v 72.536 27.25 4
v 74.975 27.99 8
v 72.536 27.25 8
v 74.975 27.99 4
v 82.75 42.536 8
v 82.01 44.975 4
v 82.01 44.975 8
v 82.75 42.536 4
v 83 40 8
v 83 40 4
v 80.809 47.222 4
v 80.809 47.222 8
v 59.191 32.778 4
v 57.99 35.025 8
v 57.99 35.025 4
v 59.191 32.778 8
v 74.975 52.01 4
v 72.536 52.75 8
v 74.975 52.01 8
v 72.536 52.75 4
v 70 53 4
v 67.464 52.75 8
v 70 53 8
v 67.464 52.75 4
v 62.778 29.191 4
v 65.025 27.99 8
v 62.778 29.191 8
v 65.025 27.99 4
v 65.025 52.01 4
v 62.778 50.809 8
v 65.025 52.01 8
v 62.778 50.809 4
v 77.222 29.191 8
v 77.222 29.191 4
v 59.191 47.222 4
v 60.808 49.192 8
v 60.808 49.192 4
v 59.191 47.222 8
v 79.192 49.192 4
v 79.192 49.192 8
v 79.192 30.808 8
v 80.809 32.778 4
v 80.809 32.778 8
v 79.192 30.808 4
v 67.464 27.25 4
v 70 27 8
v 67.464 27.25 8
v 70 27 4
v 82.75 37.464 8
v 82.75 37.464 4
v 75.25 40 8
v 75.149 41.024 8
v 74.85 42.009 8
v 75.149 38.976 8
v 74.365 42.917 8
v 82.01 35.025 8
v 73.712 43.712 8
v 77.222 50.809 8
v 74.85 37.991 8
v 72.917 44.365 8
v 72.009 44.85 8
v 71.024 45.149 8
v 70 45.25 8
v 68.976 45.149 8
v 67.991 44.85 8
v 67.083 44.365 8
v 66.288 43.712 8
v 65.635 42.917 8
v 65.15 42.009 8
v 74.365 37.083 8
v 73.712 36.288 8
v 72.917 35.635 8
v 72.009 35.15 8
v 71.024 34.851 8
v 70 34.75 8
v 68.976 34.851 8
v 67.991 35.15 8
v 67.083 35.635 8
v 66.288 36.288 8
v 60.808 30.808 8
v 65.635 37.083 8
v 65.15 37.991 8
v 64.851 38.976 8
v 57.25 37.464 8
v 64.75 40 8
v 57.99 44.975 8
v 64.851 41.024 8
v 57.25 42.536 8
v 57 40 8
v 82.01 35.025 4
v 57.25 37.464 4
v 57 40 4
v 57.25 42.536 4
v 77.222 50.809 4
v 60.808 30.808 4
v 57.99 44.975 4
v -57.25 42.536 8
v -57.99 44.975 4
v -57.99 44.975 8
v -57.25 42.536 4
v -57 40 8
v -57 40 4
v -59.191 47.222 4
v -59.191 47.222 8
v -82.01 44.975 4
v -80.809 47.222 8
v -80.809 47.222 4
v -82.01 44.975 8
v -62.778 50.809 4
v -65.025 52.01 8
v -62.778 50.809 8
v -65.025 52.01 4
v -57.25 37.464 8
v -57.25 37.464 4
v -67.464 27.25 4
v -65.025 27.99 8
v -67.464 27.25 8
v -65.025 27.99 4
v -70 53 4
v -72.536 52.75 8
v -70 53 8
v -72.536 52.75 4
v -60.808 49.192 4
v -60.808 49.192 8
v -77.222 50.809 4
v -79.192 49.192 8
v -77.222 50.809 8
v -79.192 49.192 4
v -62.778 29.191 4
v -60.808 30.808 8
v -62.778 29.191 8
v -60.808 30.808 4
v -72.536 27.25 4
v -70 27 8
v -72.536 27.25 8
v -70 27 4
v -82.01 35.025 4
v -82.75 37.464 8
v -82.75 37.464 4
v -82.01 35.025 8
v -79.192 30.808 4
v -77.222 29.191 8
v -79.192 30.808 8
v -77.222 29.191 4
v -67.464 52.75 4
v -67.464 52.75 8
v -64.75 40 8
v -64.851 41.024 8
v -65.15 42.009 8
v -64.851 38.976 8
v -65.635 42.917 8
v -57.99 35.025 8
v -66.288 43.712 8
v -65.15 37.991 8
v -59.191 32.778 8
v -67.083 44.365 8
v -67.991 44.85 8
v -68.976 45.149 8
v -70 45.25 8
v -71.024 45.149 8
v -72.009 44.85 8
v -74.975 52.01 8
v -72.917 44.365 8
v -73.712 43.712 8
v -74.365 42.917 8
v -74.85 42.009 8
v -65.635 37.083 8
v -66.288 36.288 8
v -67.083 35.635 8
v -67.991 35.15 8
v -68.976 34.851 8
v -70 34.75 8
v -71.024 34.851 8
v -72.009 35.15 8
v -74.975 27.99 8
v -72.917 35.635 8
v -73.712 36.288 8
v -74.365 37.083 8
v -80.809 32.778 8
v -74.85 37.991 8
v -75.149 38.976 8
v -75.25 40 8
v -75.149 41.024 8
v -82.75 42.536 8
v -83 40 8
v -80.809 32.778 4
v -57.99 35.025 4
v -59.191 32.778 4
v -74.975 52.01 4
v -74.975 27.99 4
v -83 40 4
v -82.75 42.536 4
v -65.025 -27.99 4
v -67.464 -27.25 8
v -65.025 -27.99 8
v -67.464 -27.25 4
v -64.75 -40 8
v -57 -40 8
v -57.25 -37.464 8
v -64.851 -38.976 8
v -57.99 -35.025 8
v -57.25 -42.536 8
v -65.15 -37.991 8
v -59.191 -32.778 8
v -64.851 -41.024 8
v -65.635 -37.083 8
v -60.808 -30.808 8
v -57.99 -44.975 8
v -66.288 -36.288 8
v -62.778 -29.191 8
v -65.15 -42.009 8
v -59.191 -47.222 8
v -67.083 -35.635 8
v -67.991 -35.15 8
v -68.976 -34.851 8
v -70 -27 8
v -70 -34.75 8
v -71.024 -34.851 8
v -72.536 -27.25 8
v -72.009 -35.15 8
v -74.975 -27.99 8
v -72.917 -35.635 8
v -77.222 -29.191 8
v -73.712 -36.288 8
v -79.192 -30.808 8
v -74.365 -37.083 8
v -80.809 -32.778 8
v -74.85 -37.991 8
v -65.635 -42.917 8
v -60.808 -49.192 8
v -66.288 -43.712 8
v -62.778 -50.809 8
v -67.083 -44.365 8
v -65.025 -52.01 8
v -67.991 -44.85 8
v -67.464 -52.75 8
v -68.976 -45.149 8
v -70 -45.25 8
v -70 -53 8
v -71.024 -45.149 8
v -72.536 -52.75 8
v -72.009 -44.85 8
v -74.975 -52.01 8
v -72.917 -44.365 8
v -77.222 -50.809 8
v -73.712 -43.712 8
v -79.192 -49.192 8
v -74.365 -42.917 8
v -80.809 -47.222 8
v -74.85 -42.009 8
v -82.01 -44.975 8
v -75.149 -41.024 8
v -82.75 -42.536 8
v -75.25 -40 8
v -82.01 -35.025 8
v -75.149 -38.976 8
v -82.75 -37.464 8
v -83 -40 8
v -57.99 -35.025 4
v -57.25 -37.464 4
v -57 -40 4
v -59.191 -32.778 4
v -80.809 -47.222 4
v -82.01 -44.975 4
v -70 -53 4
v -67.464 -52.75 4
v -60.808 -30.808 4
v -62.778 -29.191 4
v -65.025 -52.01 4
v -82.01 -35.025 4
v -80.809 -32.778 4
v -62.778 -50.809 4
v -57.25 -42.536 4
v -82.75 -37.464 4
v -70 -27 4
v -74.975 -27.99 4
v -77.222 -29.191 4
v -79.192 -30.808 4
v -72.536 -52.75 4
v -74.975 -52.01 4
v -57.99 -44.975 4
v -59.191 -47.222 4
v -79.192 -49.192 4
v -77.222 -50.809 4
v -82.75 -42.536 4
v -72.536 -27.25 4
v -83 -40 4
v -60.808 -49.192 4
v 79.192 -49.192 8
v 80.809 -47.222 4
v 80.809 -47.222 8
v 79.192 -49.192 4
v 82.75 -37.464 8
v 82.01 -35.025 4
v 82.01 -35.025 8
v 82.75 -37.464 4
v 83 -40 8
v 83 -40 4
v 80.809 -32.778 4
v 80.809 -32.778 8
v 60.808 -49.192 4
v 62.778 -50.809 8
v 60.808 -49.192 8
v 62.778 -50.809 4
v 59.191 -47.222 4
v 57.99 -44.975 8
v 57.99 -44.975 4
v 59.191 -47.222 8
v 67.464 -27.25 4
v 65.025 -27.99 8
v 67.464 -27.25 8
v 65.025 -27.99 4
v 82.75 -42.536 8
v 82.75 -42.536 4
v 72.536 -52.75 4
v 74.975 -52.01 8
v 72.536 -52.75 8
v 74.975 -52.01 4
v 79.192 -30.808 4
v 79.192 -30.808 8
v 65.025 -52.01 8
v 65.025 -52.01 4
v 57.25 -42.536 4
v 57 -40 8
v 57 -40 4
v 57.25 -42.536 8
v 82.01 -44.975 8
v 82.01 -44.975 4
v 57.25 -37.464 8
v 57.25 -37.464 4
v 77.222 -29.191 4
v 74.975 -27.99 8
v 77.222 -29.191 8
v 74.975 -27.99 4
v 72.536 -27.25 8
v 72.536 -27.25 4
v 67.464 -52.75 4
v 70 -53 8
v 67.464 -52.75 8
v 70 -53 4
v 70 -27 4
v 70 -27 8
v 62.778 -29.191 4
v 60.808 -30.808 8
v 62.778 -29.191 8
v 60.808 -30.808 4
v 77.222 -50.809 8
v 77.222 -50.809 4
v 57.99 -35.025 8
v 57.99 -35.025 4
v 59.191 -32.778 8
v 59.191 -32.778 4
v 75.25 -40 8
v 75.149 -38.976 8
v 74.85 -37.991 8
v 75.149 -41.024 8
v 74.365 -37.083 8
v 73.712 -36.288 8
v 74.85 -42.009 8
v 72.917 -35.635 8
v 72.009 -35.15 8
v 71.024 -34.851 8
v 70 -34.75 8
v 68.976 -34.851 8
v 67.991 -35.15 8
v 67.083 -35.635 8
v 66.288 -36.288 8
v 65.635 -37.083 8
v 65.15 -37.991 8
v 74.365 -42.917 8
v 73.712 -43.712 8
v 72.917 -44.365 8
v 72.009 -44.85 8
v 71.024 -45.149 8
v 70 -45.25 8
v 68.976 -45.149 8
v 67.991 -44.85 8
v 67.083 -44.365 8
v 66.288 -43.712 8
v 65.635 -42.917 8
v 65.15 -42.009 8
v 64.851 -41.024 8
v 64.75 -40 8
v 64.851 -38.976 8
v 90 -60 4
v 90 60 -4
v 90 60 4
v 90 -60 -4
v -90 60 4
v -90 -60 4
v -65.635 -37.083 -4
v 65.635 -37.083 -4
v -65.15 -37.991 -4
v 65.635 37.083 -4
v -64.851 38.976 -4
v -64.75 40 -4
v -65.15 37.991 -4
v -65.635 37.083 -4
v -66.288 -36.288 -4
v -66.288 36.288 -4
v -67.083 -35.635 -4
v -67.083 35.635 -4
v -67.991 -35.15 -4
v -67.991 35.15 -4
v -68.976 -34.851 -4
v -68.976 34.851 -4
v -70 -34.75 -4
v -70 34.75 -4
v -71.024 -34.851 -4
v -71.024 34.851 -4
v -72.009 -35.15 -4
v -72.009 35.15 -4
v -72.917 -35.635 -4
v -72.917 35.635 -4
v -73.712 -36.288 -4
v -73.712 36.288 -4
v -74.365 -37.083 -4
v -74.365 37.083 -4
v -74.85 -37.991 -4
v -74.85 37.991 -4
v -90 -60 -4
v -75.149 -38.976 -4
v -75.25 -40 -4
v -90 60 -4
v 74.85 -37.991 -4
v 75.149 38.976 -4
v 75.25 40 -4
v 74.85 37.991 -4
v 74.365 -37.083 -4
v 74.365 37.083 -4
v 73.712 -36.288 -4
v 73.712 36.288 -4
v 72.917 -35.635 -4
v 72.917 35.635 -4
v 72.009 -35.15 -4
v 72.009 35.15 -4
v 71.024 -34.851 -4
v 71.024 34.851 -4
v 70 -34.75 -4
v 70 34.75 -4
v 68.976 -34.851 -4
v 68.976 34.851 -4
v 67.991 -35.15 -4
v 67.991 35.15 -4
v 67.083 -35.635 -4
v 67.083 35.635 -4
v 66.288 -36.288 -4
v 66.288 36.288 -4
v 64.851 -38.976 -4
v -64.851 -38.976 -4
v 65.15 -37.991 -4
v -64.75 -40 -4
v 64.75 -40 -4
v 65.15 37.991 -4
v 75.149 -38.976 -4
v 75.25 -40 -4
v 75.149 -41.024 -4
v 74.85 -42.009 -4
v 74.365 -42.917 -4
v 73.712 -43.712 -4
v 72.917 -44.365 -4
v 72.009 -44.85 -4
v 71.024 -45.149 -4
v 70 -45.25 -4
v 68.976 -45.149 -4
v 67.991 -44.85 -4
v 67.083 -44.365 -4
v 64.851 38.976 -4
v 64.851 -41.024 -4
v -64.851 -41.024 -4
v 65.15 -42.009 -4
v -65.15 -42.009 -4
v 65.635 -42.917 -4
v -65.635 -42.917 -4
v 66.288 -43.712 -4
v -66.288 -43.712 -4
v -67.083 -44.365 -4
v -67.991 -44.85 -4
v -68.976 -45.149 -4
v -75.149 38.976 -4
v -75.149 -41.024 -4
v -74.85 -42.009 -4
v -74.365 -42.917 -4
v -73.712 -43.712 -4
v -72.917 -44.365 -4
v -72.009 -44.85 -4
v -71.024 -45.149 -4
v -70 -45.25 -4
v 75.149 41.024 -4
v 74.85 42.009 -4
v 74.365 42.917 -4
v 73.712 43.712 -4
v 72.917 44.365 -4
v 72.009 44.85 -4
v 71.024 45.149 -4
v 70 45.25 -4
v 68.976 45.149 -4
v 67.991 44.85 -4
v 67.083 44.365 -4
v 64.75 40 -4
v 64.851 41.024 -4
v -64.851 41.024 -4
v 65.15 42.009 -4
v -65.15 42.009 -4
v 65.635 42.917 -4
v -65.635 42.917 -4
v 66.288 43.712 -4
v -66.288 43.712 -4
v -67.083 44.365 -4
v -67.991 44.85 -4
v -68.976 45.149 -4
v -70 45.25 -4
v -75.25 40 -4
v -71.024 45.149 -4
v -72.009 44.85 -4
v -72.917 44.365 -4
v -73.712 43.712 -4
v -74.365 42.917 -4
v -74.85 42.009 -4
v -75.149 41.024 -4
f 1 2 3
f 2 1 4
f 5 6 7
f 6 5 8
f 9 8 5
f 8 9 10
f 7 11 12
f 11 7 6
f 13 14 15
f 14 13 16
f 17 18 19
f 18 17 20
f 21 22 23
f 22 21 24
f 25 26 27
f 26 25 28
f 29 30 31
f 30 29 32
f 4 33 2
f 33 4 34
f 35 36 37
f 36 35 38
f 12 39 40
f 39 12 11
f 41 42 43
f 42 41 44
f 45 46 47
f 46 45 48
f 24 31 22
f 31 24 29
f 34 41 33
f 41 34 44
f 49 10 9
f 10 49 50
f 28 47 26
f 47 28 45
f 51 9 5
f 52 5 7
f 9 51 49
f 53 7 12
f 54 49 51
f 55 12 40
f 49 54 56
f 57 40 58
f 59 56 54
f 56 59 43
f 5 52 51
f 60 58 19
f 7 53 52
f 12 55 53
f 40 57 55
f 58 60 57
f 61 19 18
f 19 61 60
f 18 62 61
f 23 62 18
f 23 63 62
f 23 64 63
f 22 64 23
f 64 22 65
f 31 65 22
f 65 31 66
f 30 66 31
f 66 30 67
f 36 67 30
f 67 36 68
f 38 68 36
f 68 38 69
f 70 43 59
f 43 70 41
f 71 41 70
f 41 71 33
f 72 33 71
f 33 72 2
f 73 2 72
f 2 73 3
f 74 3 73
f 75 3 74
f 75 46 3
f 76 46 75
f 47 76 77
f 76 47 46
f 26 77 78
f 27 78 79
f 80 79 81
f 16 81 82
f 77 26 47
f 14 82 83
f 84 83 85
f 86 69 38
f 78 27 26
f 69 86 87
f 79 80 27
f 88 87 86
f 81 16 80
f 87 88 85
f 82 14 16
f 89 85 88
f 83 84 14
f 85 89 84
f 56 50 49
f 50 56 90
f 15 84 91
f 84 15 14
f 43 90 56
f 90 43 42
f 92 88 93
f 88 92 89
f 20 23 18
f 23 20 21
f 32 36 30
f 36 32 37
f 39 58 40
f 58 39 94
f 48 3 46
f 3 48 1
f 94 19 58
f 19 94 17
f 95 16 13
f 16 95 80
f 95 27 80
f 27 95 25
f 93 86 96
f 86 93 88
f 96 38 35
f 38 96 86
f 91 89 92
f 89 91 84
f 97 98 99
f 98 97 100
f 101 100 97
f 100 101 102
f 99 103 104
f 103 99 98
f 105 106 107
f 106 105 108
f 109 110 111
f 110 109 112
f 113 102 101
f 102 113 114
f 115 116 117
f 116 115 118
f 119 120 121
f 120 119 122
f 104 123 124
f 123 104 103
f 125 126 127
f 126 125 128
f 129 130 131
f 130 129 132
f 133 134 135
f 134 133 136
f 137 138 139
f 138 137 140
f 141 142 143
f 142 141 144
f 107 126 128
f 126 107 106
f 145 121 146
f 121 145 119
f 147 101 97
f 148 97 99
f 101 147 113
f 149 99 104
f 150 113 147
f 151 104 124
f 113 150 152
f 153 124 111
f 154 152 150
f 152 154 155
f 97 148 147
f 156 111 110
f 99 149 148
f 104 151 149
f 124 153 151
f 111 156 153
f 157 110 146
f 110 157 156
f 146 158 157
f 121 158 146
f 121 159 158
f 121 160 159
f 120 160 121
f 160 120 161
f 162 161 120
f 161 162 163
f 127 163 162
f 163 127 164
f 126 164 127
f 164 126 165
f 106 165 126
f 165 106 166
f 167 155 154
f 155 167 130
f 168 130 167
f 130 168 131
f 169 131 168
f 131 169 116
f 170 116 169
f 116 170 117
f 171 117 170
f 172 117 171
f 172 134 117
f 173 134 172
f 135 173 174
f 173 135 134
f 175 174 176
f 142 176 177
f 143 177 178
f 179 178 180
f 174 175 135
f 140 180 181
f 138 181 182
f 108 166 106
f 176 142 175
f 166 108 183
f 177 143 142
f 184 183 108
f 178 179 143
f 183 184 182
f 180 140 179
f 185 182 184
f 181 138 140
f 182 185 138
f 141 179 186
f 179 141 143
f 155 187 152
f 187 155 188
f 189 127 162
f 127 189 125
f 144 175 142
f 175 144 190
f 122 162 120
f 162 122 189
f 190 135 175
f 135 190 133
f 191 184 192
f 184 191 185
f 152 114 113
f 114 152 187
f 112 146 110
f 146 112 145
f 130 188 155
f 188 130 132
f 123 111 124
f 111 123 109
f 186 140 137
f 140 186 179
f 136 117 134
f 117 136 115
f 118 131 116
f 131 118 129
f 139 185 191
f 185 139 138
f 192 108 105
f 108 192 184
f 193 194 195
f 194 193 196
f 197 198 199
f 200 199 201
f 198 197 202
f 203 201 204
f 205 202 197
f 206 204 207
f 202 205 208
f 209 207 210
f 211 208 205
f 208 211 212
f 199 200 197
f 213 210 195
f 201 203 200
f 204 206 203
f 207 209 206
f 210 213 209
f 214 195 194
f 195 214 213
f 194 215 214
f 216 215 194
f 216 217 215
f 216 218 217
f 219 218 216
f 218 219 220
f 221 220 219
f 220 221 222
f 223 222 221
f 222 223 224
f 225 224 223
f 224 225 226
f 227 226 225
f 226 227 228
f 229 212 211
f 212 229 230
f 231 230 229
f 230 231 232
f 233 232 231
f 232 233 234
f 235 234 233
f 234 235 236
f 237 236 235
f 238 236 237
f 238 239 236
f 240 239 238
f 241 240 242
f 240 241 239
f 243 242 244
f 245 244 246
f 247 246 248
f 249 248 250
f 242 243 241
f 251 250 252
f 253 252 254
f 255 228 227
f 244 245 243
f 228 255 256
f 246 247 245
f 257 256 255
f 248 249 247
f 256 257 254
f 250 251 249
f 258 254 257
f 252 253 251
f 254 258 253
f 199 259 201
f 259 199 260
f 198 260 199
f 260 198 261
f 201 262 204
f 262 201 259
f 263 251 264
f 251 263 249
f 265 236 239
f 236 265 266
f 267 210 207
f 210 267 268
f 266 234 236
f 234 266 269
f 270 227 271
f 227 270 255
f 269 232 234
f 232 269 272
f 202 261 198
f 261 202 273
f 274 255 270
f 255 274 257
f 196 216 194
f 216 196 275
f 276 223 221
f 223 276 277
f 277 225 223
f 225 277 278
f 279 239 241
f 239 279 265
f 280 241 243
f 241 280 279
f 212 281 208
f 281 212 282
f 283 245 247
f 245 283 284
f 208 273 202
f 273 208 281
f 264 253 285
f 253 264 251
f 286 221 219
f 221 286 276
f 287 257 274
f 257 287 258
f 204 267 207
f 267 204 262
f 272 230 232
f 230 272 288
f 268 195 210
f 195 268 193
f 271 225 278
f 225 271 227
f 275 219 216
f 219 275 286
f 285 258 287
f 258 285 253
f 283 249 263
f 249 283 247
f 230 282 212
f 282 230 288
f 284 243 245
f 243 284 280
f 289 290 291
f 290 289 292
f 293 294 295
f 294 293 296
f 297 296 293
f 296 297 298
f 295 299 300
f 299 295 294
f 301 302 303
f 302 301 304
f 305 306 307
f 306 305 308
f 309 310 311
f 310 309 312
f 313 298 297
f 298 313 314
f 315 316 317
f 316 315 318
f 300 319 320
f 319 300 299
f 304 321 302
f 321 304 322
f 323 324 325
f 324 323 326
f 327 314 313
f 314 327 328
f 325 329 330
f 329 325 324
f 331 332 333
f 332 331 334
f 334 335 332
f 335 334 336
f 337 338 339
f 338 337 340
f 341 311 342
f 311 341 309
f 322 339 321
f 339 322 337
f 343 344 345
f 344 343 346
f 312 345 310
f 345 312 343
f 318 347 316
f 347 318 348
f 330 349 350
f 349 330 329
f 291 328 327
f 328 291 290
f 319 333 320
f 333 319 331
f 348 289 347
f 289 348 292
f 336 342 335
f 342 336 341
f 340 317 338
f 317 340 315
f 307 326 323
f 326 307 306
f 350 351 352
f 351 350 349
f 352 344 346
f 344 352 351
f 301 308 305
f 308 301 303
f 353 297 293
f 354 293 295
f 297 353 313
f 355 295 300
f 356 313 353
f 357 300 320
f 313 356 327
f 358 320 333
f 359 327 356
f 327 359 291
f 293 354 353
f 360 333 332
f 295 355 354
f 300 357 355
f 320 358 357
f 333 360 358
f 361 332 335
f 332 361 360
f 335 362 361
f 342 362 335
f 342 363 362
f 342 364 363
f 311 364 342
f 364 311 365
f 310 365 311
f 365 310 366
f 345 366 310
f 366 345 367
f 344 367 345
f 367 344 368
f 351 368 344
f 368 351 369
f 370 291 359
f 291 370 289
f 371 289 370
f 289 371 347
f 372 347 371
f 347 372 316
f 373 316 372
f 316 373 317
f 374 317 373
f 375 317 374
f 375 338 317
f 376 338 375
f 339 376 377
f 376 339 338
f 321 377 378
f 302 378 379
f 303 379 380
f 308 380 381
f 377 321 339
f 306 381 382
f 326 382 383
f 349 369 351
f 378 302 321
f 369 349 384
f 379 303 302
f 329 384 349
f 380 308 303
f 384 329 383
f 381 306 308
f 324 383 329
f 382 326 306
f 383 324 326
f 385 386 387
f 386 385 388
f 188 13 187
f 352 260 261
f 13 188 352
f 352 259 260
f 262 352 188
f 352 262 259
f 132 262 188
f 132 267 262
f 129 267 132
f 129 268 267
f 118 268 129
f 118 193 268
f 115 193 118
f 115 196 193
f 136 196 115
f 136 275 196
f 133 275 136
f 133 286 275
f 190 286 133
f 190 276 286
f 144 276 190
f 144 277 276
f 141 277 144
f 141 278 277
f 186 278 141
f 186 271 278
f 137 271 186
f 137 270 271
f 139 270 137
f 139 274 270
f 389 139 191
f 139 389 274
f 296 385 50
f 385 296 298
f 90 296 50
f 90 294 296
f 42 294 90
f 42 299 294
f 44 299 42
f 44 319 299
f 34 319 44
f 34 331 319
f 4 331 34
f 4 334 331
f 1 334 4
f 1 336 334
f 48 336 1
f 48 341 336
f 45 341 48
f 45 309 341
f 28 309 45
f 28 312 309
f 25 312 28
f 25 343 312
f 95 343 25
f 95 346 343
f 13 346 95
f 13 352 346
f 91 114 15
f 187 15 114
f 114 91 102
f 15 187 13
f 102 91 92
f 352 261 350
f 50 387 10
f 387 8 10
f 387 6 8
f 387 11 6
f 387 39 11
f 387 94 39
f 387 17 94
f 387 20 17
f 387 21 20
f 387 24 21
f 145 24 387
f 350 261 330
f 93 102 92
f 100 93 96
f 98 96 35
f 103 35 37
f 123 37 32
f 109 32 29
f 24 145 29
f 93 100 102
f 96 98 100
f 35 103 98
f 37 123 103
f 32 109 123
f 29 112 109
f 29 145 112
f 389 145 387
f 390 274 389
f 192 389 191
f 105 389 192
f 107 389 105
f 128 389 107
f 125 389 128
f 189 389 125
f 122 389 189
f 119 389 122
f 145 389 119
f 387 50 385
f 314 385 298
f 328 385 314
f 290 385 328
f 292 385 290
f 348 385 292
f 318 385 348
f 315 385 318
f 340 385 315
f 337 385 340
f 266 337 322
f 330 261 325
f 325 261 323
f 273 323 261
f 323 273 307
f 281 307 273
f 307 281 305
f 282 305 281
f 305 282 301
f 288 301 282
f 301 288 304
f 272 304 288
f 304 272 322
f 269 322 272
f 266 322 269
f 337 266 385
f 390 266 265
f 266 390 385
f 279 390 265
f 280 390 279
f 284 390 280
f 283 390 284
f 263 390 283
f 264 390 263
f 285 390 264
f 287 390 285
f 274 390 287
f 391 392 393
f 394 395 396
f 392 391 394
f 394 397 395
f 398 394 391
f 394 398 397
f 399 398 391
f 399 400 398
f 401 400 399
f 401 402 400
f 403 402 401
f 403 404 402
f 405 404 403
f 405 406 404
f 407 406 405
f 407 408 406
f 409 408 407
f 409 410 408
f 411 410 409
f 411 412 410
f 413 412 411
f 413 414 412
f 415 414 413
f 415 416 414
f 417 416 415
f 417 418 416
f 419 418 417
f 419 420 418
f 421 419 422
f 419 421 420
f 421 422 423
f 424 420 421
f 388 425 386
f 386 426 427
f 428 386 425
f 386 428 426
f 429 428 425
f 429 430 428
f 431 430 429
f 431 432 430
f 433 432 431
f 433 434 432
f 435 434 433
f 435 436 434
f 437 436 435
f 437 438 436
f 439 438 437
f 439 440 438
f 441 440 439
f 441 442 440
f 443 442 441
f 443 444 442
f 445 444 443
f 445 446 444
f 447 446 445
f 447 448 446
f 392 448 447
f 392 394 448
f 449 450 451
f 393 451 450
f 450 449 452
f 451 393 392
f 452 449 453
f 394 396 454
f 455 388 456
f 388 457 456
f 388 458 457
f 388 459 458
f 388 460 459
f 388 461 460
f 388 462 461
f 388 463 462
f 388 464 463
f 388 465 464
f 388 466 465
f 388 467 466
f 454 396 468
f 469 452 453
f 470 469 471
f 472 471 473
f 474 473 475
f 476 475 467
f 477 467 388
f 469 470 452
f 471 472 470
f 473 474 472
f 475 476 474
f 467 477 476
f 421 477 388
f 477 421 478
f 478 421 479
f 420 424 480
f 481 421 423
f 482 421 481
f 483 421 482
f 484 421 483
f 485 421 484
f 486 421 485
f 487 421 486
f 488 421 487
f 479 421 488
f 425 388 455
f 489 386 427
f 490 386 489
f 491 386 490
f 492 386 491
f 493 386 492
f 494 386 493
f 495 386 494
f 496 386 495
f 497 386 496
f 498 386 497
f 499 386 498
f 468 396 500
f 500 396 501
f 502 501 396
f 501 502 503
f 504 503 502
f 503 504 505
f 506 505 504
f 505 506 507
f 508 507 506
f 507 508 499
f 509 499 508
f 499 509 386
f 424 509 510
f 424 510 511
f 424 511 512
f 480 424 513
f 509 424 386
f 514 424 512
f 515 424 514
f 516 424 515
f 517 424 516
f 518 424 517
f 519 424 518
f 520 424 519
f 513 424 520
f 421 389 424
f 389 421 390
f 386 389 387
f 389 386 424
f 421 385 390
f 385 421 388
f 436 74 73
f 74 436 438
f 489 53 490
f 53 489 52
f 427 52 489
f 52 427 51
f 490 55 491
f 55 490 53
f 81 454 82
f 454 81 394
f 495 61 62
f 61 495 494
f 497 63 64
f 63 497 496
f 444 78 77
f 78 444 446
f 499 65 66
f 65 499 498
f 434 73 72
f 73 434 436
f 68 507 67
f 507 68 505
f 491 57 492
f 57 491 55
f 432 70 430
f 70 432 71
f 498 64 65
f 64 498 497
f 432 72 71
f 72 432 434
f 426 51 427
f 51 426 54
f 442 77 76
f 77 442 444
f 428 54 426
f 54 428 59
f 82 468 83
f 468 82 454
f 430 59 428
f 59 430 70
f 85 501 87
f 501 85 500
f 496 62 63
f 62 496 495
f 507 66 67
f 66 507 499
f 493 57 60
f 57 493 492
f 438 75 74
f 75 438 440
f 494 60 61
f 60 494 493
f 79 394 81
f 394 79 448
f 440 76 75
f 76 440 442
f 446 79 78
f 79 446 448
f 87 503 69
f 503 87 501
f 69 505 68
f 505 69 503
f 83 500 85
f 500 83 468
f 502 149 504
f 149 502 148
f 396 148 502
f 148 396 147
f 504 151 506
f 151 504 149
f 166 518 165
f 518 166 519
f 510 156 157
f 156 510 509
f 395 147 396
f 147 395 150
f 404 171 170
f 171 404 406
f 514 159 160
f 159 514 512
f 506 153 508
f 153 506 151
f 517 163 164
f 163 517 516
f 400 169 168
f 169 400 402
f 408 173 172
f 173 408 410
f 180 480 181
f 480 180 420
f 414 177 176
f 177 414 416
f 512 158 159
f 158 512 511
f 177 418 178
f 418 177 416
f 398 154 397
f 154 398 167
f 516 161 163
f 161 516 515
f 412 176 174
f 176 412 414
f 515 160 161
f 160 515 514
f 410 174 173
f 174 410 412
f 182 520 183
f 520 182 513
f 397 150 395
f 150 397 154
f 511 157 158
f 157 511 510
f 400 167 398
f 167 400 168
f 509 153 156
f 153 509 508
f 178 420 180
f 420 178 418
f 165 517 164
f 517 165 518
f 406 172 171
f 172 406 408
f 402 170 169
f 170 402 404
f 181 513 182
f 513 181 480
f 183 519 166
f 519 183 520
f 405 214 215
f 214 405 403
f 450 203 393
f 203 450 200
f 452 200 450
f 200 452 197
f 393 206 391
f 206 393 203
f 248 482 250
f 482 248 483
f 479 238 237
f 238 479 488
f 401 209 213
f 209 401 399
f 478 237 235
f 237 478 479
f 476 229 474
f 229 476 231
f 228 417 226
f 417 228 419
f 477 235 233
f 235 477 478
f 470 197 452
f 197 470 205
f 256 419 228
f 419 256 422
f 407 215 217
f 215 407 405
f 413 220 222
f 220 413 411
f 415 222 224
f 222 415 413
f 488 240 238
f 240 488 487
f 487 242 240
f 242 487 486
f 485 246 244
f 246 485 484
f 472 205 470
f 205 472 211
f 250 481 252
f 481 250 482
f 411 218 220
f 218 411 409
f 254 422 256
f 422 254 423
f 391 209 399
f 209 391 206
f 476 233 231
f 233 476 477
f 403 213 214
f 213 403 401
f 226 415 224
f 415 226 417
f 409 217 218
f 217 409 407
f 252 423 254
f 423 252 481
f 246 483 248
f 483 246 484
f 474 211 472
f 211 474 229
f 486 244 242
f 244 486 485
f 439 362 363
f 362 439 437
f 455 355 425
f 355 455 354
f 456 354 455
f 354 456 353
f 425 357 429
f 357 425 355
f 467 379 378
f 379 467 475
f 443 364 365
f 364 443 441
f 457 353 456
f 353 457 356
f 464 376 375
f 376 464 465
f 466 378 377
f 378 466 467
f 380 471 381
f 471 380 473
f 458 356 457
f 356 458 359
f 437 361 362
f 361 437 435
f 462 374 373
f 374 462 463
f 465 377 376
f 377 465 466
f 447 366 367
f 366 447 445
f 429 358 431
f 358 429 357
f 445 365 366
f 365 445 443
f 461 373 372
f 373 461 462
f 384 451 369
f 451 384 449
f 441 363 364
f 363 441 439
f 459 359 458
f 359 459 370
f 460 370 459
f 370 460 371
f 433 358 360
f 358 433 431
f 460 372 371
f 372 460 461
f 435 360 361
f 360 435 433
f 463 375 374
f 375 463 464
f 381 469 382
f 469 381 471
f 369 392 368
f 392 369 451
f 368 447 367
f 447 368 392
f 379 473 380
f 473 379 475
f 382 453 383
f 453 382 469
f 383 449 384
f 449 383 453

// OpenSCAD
$fn = 32;

// ----------------------------------------------------------------------
// Anchor pads 180 x 120 x 12
// four corner bosses with anchor holes
// ----------------------------------------------------------------------

// --- parameters (mm) ---
plate = [180, 120, 8];  // base plate size (x, y, z)
pads = 4;               // boss count, one per corner
edge = 20;              // boss centre offset from the plate edge
boss_d = 26;            // boss diameter
boss_h = 4;             // boss height above the base plate
hole_d = 10.5;          // hole diameter

// --- derived feature positions (mm) ---
height = plate[2] + boss_h;      // = 12   overall height of the part
corner_x = plate[0] / 2 - edge;  // = 70   boss centre X
corner_y = plate[1] / 2 - edge;  // = 40   boss centre Y
feature_centers = [
  [corner_x, corner_y],
  [-corner_x, corner_y],
  [-corner_x, -corner_y],
  [corner_x, -corner_y]
];   // boss centres, anchor holes are drilled there

// base plate, four bosses standing on it, anchor holes all the way through
difference() {
  union() {
    cube(plate, center = true);
    for (centre = feature_centers)
      translate([centre[0], centre[1], plate[2] / 2 - 1])
        cylinder(d = boss_d, h = boss_h + 1);
  }
  for (centre = feature_centers)
    translate([centre[0], centre[1], -height])
      cylinder(d = hole_d, h = 2 * height + 2);  // through boss and plate
}
